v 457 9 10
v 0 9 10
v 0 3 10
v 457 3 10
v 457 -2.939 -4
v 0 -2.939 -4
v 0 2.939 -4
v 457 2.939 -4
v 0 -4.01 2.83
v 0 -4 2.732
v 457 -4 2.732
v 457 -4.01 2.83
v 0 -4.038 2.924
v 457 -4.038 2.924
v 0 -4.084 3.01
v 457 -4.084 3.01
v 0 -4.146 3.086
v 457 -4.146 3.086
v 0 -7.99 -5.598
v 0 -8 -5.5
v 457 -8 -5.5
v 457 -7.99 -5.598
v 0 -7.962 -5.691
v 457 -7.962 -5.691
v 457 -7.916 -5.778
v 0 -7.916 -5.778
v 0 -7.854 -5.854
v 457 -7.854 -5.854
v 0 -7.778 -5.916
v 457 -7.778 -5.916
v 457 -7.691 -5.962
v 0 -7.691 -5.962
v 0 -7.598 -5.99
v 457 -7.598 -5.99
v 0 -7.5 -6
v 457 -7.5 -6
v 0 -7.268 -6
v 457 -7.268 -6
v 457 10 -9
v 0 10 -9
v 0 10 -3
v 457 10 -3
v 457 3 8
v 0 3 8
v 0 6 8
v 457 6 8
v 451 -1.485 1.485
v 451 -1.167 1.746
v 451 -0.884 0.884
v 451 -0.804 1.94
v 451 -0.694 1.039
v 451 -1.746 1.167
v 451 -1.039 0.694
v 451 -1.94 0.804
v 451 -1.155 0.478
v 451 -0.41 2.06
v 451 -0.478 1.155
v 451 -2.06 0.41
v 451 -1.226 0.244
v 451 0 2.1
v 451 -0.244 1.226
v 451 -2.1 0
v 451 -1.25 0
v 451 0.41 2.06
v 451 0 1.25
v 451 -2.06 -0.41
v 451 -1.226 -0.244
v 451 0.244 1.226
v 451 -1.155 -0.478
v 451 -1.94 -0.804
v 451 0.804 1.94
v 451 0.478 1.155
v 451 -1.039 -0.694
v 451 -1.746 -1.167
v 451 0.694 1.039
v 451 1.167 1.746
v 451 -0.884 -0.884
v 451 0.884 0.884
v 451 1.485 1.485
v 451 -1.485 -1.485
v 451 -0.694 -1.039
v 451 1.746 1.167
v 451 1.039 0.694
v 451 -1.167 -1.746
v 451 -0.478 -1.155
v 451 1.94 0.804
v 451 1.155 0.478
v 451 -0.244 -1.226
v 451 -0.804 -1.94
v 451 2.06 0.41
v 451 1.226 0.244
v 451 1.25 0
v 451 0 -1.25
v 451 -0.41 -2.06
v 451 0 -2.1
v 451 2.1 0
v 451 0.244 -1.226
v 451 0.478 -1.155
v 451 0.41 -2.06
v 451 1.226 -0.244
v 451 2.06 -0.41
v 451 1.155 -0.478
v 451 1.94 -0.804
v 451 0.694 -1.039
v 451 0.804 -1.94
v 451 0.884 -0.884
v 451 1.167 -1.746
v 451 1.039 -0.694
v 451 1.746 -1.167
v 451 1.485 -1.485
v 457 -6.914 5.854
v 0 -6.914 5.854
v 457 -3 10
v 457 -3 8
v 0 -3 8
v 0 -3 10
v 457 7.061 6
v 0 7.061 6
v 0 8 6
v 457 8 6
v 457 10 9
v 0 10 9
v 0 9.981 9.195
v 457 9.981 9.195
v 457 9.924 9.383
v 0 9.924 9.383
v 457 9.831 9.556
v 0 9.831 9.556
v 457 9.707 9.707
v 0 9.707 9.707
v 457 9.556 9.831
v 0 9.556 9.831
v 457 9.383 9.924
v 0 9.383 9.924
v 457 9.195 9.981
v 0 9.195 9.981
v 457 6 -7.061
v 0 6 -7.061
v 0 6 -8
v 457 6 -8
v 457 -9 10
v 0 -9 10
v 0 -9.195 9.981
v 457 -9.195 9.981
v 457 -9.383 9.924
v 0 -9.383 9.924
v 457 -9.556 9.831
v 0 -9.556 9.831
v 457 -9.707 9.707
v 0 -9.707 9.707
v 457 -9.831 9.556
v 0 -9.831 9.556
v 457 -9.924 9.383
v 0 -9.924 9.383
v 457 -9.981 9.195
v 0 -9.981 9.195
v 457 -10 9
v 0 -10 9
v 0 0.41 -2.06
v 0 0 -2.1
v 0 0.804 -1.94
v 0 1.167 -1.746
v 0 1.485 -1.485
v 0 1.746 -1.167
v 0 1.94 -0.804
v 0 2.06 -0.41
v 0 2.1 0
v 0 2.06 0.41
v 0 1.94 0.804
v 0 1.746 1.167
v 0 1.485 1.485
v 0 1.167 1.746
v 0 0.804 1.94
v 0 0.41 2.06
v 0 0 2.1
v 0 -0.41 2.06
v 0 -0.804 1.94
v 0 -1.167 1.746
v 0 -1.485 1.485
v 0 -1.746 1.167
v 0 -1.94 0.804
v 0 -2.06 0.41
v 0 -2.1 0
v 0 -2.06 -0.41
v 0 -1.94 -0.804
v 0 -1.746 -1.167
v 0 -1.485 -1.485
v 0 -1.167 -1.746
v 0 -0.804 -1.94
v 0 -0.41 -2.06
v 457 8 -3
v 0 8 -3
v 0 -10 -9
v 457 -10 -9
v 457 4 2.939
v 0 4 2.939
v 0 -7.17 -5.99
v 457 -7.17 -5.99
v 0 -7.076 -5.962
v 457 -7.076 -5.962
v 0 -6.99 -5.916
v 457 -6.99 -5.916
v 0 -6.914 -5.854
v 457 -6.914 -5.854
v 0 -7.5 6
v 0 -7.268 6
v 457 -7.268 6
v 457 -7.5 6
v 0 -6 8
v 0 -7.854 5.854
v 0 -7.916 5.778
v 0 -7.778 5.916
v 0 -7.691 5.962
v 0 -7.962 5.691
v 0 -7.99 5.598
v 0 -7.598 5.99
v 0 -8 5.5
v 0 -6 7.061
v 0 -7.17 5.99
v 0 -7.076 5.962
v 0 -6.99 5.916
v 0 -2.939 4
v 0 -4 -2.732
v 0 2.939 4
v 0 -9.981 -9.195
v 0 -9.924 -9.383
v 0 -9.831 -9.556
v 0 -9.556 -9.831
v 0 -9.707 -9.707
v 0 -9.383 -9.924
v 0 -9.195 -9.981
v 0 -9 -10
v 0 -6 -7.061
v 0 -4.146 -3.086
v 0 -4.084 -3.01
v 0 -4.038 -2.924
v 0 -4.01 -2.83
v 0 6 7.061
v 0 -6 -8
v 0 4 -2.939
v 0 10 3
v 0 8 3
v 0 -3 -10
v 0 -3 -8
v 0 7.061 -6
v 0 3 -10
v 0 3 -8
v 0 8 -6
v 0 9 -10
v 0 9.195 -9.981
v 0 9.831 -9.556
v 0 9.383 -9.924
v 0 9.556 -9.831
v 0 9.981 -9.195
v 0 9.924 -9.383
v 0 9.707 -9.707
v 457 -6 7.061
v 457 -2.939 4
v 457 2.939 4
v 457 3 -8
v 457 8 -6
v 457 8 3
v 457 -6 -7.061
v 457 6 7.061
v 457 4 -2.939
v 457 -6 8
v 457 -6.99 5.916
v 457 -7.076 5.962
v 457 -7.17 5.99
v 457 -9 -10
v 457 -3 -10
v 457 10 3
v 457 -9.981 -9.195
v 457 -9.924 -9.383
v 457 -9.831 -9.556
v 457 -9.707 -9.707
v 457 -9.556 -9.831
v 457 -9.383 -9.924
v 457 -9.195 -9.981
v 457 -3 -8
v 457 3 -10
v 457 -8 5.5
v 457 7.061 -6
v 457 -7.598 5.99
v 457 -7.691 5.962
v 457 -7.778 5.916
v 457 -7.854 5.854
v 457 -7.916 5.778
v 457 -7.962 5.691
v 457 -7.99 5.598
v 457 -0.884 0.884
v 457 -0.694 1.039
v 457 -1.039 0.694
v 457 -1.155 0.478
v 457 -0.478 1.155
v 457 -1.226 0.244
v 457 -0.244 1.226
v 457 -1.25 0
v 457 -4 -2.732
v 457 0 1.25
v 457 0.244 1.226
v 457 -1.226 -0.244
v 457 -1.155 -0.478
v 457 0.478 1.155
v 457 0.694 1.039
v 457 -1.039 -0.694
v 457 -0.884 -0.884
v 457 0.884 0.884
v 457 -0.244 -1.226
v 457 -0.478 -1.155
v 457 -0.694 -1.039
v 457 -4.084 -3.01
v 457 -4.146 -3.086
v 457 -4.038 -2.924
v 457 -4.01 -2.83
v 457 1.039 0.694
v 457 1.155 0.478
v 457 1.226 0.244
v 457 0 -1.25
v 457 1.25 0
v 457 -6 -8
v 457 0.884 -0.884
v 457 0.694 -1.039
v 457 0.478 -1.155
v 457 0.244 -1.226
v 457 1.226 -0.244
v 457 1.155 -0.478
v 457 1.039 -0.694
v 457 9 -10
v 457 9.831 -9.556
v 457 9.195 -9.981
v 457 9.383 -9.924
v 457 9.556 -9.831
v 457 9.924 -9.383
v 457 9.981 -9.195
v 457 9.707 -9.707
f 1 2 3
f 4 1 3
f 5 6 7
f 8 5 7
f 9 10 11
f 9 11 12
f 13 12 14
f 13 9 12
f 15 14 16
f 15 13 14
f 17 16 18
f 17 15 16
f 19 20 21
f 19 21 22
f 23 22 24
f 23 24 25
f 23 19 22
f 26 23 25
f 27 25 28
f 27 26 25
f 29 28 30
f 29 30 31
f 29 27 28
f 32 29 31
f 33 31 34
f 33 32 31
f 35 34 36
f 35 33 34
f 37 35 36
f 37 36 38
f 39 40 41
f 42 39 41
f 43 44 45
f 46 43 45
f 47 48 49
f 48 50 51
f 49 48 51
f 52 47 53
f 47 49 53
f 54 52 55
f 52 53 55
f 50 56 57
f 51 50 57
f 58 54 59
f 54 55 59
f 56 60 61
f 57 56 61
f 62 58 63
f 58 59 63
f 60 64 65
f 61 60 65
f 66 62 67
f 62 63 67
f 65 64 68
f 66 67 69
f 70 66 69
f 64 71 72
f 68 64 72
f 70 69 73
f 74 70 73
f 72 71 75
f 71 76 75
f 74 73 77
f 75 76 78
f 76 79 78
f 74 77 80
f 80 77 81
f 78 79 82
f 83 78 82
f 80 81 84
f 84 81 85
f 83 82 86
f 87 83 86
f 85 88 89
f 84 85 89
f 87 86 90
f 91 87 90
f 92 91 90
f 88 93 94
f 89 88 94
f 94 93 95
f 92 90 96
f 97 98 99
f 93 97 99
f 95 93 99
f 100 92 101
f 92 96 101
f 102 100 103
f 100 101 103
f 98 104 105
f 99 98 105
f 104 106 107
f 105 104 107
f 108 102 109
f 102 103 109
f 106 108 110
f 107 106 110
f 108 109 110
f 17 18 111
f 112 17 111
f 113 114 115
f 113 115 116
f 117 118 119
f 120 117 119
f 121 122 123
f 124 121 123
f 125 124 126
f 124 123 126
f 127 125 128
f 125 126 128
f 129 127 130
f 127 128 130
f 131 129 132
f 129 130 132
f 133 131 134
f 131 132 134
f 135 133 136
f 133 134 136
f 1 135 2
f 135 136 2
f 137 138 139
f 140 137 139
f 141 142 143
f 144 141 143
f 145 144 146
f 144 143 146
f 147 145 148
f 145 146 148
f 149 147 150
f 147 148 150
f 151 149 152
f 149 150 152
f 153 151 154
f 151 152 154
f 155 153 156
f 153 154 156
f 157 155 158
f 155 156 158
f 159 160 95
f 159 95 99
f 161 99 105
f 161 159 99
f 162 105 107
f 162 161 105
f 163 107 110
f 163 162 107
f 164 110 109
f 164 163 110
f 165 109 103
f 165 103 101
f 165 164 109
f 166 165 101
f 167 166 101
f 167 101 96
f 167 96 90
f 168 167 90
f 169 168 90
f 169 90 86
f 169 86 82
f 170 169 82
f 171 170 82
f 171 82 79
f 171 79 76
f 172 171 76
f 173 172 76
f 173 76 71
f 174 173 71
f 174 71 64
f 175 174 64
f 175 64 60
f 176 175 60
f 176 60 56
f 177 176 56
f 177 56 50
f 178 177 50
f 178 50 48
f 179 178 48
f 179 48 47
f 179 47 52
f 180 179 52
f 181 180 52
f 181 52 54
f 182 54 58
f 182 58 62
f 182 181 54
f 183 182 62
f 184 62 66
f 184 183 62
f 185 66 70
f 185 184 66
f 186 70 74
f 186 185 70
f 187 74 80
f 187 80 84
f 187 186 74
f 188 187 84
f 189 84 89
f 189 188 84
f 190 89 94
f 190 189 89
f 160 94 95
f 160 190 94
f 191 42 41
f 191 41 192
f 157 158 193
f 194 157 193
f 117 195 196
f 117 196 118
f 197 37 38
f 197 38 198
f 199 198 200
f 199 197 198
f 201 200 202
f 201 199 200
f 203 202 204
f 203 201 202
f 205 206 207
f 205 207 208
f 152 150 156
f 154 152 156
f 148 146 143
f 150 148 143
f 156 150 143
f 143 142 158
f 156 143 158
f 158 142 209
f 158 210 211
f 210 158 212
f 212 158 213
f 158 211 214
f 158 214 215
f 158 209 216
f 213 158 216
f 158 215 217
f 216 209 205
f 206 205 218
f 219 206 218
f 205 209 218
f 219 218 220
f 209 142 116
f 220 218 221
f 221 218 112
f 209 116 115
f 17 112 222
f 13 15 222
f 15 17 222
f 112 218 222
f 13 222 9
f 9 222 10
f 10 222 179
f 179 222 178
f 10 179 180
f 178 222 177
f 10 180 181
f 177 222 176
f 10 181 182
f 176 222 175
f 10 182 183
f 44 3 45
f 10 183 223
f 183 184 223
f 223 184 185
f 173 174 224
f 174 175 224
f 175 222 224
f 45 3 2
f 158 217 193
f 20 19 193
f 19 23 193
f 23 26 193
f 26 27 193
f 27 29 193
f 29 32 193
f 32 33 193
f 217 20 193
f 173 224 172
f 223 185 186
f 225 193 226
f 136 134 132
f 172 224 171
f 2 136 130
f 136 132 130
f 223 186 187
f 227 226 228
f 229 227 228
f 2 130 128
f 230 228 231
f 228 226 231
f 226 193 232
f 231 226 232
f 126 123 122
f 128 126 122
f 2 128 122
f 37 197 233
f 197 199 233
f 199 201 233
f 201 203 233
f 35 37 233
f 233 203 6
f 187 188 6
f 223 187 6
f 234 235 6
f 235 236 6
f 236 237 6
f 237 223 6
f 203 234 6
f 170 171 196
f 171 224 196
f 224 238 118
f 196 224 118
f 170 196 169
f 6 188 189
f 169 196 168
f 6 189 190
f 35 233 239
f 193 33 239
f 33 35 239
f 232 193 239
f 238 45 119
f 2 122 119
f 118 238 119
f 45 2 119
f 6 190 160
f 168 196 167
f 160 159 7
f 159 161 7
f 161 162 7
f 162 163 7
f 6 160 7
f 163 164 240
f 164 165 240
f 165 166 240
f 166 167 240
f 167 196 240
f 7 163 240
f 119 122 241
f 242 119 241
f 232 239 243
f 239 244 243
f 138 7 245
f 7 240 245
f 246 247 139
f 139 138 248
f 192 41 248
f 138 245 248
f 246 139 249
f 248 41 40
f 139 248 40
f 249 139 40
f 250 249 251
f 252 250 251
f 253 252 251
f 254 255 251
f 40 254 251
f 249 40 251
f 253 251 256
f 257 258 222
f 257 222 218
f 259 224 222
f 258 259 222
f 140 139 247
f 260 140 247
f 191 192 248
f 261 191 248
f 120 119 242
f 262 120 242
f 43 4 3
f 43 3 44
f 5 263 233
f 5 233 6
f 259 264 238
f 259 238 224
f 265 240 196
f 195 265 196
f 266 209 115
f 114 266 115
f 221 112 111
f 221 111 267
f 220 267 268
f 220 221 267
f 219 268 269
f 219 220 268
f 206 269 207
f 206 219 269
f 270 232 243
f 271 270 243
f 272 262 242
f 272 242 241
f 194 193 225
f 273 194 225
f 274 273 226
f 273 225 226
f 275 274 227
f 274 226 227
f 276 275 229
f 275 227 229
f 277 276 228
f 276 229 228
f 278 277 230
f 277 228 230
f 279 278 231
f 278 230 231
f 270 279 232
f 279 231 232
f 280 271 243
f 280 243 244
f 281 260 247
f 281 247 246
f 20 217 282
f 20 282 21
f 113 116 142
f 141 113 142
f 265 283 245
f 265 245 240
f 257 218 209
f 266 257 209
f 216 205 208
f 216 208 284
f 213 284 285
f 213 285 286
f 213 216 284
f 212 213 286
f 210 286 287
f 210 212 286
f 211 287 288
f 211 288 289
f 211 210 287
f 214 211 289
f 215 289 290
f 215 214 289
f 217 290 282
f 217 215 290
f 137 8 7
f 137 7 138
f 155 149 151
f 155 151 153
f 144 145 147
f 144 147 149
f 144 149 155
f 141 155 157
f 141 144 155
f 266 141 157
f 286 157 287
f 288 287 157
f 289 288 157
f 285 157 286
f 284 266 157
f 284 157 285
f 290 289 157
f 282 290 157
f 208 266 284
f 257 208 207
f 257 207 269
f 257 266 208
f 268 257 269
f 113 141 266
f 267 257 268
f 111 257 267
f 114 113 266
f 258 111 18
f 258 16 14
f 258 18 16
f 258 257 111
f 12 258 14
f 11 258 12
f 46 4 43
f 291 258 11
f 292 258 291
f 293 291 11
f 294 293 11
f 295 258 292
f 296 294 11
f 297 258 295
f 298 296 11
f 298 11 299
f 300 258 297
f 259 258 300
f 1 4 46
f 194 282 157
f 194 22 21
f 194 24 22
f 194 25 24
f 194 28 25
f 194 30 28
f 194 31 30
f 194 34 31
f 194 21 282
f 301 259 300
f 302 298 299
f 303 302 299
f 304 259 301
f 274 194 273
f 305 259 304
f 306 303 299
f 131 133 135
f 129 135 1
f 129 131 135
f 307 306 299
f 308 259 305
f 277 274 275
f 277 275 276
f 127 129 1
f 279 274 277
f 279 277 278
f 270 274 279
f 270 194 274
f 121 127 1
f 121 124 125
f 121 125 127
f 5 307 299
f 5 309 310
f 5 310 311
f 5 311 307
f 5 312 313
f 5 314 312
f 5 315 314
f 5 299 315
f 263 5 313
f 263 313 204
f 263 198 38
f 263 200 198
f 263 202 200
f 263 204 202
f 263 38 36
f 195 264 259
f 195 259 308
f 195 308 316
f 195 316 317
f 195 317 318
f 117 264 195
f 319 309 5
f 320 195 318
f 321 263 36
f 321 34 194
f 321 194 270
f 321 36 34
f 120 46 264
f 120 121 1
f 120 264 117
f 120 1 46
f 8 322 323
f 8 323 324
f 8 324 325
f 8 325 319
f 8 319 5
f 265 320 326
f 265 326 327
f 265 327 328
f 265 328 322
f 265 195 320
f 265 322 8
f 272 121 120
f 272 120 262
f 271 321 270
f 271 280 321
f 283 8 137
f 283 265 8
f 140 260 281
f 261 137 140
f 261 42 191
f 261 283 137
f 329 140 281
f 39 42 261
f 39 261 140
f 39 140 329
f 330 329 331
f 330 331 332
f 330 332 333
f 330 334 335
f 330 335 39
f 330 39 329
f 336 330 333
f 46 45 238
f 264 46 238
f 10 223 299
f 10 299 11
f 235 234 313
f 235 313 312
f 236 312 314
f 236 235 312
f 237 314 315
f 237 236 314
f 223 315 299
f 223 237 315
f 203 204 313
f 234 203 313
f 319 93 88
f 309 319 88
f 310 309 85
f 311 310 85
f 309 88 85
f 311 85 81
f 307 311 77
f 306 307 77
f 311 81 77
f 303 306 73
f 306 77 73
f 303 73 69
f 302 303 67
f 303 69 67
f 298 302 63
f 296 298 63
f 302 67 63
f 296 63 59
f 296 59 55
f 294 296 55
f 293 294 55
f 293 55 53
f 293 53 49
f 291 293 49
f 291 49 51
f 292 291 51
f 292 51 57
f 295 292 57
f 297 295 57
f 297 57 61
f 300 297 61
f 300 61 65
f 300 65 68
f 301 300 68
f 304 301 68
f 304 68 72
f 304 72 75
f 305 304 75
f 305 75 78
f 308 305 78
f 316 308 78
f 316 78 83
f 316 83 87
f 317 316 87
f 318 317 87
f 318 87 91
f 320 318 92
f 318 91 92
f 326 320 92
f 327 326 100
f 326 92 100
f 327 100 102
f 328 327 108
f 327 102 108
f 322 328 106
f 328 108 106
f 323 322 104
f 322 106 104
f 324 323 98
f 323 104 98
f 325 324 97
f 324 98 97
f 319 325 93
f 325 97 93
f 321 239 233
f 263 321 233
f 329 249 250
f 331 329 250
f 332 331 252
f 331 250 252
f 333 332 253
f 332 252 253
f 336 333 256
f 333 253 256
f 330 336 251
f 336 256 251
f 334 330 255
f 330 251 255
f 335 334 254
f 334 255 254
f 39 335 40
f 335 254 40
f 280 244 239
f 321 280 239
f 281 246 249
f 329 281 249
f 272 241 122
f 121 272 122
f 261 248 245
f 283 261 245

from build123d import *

# Parameters (mm, degrees)
SKETCH1_R           = 2.1
BOSS_EXTRUDE1_DEPTH = 457
SKETCH19_R          = 2.1
BOSS_EXTRUDE7_DEPTH = 6
TAPPED_HOLE6_D      = 2.5
TAPPED_HOLE6_DEPTH  = 6


with BuildPart() as part:
    # Sketch1 → Boss-Extrude1 (new body)
    with BuildSketch(Plane(origin=(0, 0, 0), x_dir=(0, 0, -1), z_dir=(1, 0, 0))):
        with BuildLine():
            Line((-10, 9), (-10, 3))
            Line((-10, 3), (-8, 3))
            Line((-8, 3), (-8, 6))
            Line((-8, 6), (-7.060660172, 6))
            Line((-7.060660172, 6), (-4, 2.939339828))
            Line((-4, 2.939339828), (-4, -2.939339828))
            Line((-4, -2.939339828), (-7.060660172, -6))
            Line((-7.060660172, -6), (-8, -6))
            Line((-8, -6), (-8, -3))
            Line((-8, -3), (-10, -3))
            Line((-10, -3), (-10, -9))
            ThreePointArc((-10, -9), (-9.707106781, -9.707106781), (-9, -10))
            Line((-9, -10), (9, -10))
            ThreePointArc((9, -10), (9.707106781, -9.707106781), (10, -9))
            Line((10, -9), (10, -3))
            Line((10, -3), (8, -3))
            Line((8, -3), (8, -6))
            Line((8, -6), (7.060660172, -6))
            Line((7.060660172, -6), (4, -2.939339828))
            Line((4, -2.939339828), (4, 2.939339828))
            Line((4, 2.939339828), (7.060660172, 6))
            Line((7.060660172, 6), (8, 6))
            Line((8, 6), (8, 3))
            Line((8, 3), (10, 3))
            Line((10, 3), (10, 9))
            ThreePointArc((10, 9), (9.707106781, 9.707106781), (9, 10))
            Line((9, 10), (3, 10))
            Line((3, 10), (3, 8))
            Line((3, 8), (6, 8))
            Line((6, 8), (6, 7.060660172))
            Line((6, 7.060660172), (2.939339828, 4))
            Line((2.939339828, 4), (-2.939339828, 4))
            Line((-2.939339828, 4), (-6, 7.060660172))
            Line((-6, 7.060660172), (-6, 8))
            Line((-6, 8), (-3, 8))
            Line((-3, 8), (-3, 10))
            Line((-3, 10), (-9, 10))
            ThreePointArc((-9, 10), (-9.707106781, 9.707106781), (-10, 9))
        make_face()
        Circle(SKETCH1_R, mode=Mode.SUBTRACT)
        with BuildLine():
            Line((-6, -7.267766953), (-6, -7.5))
            ThreePointArc((-6, -7.5), (-5.853553391, -7.853553391), (-5.5, -8))
            Line((-5.5, -8), (5.5, -8))
            ThreePointArc((5.5, -8), (5.853553391, -7.853553391), (6, -7.5))
            Line((6, -7.5), (6, -7.267766953))
            ThreePointArc((6, -7.267766953), (5.961939766, -7.076425237), (5.853553391, -6.914213562))
            Line((5.853553391, -6.914213562), (3.085786438, -4.146446609))
            ThreePointArc((3.085786438, -4.146446609), (2.923574763, -4.038060234), (2.732233047, -4))
            Line((2.732233047, -4), (-2.732233047, -4))
            ThreePointArc((-2.732233047, -4), (-2.923574763, -4.038060234), (-3.085786438, -4.146446609))
            Line((-3.085786438, -4.146446609), (-5.853553391, -6.914213562))
            ThreePointArc((-5.853553391, -6.914213562), (-5.961939766, -7.076425237), (-6, -7.267766953))
        make_face(mode=Mode.SUBTRACT)
    extrude(amount=BOSS_EXTRUDE1_DEPTH)

    # Sketch19 → Boss-Extrude7 (add)
    with BuildSketch(Plane(origin=(457, 0, 0), x_dir=(0, 0, -1), z_dir=(1, 0, 0))):
        Circle(SKETCH19_R)
    extrude(amount=-BOSS_EXTRUDE7_DEPTH)

    # Tapped Hole6
    with Locations(Plane(origin=(457, 0, -33.955827028), x_dir=(0, 0, 1), z_dir=(1, 0, 0))):
        with Locations((33.955827028, 0)):
            Hole(TAPPED_HOLE6_D / 2, depth=TAPPED_HOLE6_DEPTH)


solid = part.part
